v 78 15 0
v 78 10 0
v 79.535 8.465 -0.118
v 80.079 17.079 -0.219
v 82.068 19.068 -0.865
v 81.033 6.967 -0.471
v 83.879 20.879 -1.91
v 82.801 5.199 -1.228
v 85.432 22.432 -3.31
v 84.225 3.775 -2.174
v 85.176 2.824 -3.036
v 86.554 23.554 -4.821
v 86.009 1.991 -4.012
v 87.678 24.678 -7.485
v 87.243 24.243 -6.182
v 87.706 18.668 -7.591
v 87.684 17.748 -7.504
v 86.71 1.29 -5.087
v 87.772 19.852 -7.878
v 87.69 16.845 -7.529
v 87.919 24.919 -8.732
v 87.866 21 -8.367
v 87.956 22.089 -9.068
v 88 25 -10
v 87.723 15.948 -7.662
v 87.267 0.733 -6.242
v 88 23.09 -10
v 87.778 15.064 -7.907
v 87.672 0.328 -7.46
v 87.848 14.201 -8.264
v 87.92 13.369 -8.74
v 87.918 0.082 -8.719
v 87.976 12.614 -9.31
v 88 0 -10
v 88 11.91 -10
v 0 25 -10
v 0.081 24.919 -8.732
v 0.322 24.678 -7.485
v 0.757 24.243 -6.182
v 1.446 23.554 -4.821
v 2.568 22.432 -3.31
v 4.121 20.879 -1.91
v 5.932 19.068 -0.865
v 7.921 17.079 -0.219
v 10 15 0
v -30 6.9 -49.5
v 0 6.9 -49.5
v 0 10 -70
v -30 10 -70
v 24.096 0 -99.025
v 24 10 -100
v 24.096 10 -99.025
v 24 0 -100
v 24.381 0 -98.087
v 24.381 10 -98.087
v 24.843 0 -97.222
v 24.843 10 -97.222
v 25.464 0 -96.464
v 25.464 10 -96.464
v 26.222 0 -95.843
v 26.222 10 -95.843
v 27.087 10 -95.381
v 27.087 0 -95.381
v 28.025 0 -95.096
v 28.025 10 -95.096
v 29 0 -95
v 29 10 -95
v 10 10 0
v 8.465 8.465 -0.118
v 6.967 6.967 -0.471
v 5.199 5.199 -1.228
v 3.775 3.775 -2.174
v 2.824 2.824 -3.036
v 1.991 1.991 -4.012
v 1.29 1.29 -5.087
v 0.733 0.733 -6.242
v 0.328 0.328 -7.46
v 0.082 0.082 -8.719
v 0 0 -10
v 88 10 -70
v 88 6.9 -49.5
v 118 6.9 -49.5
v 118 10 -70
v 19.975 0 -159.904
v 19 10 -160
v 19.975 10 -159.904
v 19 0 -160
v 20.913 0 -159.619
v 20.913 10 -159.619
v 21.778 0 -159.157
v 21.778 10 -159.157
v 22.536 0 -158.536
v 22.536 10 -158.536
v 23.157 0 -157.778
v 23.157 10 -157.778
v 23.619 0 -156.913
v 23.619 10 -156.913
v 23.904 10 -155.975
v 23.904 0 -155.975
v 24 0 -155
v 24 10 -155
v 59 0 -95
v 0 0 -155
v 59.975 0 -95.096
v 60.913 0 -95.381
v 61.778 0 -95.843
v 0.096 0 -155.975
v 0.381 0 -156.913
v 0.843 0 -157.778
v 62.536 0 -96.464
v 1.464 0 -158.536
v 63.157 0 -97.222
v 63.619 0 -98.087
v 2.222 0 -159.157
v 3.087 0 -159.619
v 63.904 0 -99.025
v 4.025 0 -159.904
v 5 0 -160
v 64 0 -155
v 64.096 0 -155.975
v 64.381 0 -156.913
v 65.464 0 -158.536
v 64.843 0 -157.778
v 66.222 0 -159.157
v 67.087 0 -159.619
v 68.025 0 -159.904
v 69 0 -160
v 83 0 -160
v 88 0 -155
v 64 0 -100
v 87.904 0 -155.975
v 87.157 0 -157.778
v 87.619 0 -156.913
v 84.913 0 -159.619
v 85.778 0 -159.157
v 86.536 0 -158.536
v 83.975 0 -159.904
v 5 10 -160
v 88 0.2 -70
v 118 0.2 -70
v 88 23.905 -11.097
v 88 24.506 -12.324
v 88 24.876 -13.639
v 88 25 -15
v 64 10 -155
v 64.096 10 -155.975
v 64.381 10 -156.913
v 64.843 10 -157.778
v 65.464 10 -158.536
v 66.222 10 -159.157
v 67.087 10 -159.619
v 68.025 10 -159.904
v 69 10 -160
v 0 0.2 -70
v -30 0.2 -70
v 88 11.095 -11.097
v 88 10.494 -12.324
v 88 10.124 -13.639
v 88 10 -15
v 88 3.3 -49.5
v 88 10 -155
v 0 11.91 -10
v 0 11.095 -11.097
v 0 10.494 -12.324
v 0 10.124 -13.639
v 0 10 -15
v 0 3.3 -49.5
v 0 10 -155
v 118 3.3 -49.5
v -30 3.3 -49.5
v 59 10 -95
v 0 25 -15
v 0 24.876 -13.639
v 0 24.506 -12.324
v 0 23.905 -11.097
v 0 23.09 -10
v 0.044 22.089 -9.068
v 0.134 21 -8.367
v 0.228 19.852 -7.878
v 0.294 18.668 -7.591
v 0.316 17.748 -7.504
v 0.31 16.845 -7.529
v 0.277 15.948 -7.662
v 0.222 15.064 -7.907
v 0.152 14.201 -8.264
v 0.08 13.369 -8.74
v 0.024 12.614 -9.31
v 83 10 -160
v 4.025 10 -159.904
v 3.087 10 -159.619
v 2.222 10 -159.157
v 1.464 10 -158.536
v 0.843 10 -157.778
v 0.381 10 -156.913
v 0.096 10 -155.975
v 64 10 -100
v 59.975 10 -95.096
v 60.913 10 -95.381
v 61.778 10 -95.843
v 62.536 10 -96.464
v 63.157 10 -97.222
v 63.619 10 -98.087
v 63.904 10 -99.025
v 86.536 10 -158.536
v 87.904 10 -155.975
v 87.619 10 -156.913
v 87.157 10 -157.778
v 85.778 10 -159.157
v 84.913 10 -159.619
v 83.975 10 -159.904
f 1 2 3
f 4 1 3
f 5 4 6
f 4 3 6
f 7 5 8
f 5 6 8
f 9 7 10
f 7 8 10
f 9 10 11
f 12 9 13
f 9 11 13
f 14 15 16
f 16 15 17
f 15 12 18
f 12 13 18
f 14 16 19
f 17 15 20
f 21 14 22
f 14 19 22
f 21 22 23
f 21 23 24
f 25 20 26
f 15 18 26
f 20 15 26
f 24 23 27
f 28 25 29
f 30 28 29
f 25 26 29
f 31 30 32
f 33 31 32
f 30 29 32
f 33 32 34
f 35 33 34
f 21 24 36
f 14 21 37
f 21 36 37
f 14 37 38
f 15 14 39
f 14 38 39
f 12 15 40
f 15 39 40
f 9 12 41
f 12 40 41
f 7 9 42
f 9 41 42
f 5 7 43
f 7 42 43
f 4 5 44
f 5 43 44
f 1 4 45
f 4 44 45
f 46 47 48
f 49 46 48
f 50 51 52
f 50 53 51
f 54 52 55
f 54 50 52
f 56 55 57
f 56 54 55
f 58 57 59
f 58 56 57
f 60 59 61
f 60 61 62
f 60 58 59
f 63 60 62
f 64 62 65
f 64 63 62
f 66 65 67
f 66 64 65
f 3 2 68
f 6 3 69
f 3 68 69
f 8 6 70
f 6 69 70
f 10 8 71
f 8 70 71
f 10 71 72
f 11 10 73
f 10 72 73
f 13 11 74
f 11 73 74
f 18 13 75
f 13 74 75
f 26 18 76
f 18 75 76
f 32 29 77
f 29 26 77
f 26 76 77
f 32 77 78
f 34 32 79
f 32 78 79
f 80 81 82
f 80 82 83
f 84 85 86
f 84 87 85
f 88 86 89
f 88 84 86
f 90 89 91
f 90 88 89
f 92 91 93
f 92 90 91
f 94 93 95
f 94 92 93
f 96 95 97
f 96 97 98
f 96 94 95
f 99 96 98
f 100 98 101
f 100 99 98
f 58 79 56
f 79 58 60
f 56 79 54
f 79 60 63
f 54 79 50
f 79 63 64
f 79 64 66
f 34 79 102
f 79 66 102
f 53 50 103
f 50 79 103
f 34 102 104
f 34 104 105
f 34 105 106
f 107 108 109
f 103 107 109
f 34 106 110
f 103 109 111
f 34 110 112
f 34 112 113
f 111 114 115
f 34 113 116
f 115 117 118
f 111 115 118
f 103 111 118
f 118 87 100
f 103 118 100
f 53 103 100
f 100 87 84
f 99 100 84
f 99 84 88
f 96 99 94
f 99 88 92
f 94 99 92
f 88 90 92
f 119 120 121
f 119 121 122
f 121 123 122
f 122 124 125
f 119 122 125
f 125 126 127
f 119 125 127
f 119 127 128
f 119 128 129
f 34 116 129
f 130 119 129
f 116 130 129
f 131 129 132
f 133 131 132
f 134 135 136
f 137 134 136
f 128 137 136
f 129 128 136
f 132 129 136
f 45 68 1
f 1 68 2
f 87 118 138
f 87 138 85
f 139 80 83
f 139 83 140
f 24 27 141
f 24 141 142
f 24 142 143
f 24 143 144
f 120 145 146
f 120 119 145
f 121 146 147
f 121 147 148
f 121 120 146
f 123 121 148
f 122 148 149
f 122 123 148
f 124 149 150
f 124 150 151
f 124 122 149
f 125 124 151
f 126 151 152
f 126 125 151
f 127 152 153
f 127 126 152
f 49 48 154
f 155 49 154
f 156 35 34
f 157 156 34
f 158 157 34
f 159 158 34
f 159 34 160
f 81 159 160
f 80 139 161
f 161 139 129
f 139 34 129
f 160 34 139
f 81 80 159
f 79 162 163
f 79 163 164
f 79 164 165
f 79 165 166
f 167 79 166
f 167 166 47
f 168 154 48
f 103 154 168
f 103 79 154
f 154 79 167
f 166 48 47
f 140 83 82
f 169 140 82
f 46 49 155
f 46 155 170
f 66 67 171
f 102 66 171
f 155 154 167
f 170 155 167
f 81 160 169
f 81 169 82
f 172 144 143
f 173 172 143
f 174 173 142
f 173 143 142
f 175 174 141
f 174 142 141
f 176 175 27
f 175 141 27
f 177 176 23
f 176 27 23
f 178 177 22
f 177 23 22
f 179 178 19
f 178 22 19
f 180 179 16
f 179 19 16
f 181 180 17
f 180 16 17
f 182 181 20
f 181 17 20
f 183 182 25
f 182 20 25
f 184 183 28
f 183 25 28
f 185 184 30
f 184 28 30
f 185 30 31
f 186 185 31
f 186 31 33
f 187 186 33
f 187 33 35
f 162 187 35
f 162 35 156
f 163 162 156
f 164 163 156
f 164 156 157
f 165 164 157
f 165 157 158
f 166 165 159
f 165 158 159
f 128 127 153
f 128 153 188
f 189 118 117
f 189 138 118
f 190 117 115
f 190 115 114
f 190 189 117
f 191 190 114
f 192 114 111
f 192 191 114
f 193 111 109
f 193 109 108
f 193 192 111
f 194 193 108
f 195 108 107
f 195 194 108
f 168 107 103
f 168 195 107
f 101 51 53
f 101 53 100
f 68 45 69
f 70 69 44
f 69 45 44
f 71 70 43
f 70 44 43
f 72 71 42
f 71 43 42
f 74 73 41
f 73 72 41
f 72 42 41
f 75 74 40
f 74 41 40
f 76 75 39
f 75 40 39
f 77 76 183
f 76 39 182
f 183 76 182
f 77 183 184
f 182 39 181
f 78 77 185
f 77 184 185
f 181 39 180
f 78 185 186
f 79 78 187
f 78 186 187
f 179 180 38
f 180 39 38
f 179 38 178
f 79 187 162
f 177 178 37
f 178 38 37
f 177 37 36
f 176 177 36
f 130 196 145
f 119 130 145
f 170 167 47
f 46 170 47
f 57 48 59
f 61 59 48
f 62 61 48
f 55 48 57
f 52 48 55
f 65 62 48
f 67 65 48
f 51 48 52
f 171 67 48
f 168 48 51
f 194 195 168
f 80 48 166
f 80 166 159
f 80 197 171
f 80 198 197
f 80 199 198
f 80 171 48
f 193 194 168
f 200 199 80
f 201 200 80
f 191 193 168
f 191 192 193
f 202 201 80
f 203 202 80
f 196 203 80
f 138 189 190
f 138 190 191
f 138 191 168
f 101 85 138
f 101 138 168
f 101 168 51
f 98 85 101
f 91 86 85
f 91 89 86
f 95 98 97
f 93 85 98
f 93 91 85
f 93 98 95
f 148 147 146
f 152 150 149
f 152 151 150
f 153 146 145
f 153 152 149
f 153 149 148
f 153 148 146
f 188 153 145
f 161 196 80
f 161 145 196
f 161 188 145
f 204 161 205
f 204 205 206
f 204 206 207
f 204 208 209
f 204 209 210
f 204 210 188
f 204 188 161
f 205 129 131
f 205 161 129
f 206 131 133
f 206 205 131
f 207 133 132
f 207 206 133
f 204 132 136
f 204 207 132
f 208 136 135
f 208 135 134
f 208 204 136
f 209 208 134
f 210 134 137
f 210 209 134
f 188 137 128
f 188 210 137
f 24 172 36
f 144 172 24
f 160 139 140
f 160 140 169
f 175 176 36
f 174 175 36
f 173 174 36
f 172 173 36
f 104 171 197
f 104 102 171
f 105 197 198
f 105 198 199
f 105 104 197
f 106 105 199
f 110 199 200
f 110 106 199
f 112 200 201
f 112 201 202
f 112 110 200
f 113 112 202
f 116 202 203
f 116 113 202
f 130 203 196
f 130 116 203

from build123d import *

# Parameters (mm, degrees)
SKETCH1_W           = 88
SKETCH1_H           = 160
BOSS_EXTRUDE1_DEPTH = 10
SKETCH2_W           = 88
SKETCH2_H           = 15
BOSS_EXTRUDE2_DEPTH = 15
SKETCH3_R           = 7.5
CUT_EXTRUDE1_DEPTH  = 88
FILLET1_R           = 10
SKETCH4_W           = 40
SKETCH4_H           = 65
CUT_EXTRUDE2_DEPTH  = 10
FILLET2_R           = 5
FILLET3_R           = 5
BOSS_EXTRUDE4_DEPTH = 30


with BuildPart() as part:
    # Sketch1 → Boss-Extrude1 (new body)
    with BuildSketch(Plane(origin=(0, 0, 0), x_dir=(1, 0, 0), z_dir=(0, 1, 0))):
        with Locations((44, 80)):
            Rectangle(SKETCH1_W, SKETCH1_H)
    extrude(amount=BOSS_EXTRUDE1_DEPTH)

    # Sketch2 → Boss-Extrude2 (add)
    with BuildSketch(Plane(origin=(0, 10, 0), x_dir=(1, 0, 0), z_dir=(0, 1, 0))):
        with Locations((44, 7.5)):
            Rectangle(SKETCH2_W, SKETCH2_H)
    extrude(amount=BOSS_EXTRUDE2_DEPTH)

    # Sketch3 → Cut-Extrude1 (cut)
    with BuildSketch(Plane(origin=(88, 0, 0), x_dir=(0, 0, -1), z_dir=(1, 0, 0))):
        with Locations((15, 17.5)):
            Circle(SKETCH3_R)
    extrude(amount=-CUT_EXTRUDE1_DEPTH, mode=Mode.SUBTRACT)

    # Fillet1
    # the kernel refuses this fillet: 10 mm, written as the material it takes off along each edge
    with BuildSketch(Plane(origin=(-25, 25, 0), x_dir=(0, -1, 0), z_dir=(1, 0, 0))) as fillet1_piece_1:
        with BuildLine():
            CenterArc((FILLET1_R, FILLET1_R), FILLET1_R, 180, 90)
            Line((0, FILLET1_R), (0, 0))
            Line((0, 0), (FILLET1_R, 0))
        make_face()
    extrude(amount=138, mode=Mode.SUBTRACT)
    with BuildSketch(Plane(origin=(-25, 0, 0), x_dir=(0, 1, 0), z_dir=(1, 0, 0))) as fillet1_piece_2:
        with BuildLine():
            CenterArc((FILLET1_R, -FILLET1_R), FILLET1_R, 90, 90)
            Line((0, -FILLET1_R), (0, 0))
            Line((0, 0), (FILLET1_R, 0))
        make_face()
    extrude(amount=138, mode=Mode.SUBTRACT)
    with BuildSketch(Plane(origin=(88, -25, 0), x_dir=(-1, 0, 0), z_dir=(0, 1, 0)), Plane(origin=(0, 50, 0), x_dir=(1, 0, 0), z_dir=(0, -1, 0))) as fillet1_piece_3:
        with BuildLine():
            CenterArc((FILLET1_R, -FILLET1_R), FILLET1_R, 90, 90)
            Line((0, -FILLET1_R), (0, 0))
            Line((0, 0), (FILLET1_R, 0))
        make_face()
    extrude(amount=75, mode=Mode.SUBTRACT)

    # Sketch4 → Cut-Extrude2 (cut)
    with BuildSketch(Plane(origin=(0, 10, 0), x_dir=(1, 0, 0), z_dir=(0, 1, 0))):
        with Locations((44, 127.5)):
            Rectangle(SKETCH4_W, SKETCH4_H)
    extrude(amount=-CUT_EXTRUDE2_DEPTH, mode=Mode.SUBTRACT)

    # Fillet2
    fillet2_edges = [part.edges().sort_by_distance(p)[0] for p in [
        (64, 5, -95),
        (24, 5, -95),
        (24, 5, -160),
        (64, 5, -160),
    ]]
    fillet(fillet2_edges, radius=FILLET2_R)

    # Fillet3
    fillet3_edges = [part.edges().sort_by_distance(p)[0] for p in [
        (0, 5, -160),
        (88, 5, -160),
    ]]
    fillet(fillet3_edges, radius=FILLET3_R)

    # Sketch5 → Boss-Extrude4 (add)
    with BuildSketch(Plane.ZY):
        Polygon((-70, 10), (-70, 0.2), (-49.5, 3.3), (-49.5, 6.9), align=None)
    boss_extrude4 = extrude(amount=BOSS_EXTRUDE4_DEPTH)

    # Mirror1: Boss-Extrude4 across plane
    add(boss_extrude4.mirror(Plane(origin=(44, 0, 0), x_dir=(0, 0, 1), z_dir=(1, 0, 0))))


solid = part.part
